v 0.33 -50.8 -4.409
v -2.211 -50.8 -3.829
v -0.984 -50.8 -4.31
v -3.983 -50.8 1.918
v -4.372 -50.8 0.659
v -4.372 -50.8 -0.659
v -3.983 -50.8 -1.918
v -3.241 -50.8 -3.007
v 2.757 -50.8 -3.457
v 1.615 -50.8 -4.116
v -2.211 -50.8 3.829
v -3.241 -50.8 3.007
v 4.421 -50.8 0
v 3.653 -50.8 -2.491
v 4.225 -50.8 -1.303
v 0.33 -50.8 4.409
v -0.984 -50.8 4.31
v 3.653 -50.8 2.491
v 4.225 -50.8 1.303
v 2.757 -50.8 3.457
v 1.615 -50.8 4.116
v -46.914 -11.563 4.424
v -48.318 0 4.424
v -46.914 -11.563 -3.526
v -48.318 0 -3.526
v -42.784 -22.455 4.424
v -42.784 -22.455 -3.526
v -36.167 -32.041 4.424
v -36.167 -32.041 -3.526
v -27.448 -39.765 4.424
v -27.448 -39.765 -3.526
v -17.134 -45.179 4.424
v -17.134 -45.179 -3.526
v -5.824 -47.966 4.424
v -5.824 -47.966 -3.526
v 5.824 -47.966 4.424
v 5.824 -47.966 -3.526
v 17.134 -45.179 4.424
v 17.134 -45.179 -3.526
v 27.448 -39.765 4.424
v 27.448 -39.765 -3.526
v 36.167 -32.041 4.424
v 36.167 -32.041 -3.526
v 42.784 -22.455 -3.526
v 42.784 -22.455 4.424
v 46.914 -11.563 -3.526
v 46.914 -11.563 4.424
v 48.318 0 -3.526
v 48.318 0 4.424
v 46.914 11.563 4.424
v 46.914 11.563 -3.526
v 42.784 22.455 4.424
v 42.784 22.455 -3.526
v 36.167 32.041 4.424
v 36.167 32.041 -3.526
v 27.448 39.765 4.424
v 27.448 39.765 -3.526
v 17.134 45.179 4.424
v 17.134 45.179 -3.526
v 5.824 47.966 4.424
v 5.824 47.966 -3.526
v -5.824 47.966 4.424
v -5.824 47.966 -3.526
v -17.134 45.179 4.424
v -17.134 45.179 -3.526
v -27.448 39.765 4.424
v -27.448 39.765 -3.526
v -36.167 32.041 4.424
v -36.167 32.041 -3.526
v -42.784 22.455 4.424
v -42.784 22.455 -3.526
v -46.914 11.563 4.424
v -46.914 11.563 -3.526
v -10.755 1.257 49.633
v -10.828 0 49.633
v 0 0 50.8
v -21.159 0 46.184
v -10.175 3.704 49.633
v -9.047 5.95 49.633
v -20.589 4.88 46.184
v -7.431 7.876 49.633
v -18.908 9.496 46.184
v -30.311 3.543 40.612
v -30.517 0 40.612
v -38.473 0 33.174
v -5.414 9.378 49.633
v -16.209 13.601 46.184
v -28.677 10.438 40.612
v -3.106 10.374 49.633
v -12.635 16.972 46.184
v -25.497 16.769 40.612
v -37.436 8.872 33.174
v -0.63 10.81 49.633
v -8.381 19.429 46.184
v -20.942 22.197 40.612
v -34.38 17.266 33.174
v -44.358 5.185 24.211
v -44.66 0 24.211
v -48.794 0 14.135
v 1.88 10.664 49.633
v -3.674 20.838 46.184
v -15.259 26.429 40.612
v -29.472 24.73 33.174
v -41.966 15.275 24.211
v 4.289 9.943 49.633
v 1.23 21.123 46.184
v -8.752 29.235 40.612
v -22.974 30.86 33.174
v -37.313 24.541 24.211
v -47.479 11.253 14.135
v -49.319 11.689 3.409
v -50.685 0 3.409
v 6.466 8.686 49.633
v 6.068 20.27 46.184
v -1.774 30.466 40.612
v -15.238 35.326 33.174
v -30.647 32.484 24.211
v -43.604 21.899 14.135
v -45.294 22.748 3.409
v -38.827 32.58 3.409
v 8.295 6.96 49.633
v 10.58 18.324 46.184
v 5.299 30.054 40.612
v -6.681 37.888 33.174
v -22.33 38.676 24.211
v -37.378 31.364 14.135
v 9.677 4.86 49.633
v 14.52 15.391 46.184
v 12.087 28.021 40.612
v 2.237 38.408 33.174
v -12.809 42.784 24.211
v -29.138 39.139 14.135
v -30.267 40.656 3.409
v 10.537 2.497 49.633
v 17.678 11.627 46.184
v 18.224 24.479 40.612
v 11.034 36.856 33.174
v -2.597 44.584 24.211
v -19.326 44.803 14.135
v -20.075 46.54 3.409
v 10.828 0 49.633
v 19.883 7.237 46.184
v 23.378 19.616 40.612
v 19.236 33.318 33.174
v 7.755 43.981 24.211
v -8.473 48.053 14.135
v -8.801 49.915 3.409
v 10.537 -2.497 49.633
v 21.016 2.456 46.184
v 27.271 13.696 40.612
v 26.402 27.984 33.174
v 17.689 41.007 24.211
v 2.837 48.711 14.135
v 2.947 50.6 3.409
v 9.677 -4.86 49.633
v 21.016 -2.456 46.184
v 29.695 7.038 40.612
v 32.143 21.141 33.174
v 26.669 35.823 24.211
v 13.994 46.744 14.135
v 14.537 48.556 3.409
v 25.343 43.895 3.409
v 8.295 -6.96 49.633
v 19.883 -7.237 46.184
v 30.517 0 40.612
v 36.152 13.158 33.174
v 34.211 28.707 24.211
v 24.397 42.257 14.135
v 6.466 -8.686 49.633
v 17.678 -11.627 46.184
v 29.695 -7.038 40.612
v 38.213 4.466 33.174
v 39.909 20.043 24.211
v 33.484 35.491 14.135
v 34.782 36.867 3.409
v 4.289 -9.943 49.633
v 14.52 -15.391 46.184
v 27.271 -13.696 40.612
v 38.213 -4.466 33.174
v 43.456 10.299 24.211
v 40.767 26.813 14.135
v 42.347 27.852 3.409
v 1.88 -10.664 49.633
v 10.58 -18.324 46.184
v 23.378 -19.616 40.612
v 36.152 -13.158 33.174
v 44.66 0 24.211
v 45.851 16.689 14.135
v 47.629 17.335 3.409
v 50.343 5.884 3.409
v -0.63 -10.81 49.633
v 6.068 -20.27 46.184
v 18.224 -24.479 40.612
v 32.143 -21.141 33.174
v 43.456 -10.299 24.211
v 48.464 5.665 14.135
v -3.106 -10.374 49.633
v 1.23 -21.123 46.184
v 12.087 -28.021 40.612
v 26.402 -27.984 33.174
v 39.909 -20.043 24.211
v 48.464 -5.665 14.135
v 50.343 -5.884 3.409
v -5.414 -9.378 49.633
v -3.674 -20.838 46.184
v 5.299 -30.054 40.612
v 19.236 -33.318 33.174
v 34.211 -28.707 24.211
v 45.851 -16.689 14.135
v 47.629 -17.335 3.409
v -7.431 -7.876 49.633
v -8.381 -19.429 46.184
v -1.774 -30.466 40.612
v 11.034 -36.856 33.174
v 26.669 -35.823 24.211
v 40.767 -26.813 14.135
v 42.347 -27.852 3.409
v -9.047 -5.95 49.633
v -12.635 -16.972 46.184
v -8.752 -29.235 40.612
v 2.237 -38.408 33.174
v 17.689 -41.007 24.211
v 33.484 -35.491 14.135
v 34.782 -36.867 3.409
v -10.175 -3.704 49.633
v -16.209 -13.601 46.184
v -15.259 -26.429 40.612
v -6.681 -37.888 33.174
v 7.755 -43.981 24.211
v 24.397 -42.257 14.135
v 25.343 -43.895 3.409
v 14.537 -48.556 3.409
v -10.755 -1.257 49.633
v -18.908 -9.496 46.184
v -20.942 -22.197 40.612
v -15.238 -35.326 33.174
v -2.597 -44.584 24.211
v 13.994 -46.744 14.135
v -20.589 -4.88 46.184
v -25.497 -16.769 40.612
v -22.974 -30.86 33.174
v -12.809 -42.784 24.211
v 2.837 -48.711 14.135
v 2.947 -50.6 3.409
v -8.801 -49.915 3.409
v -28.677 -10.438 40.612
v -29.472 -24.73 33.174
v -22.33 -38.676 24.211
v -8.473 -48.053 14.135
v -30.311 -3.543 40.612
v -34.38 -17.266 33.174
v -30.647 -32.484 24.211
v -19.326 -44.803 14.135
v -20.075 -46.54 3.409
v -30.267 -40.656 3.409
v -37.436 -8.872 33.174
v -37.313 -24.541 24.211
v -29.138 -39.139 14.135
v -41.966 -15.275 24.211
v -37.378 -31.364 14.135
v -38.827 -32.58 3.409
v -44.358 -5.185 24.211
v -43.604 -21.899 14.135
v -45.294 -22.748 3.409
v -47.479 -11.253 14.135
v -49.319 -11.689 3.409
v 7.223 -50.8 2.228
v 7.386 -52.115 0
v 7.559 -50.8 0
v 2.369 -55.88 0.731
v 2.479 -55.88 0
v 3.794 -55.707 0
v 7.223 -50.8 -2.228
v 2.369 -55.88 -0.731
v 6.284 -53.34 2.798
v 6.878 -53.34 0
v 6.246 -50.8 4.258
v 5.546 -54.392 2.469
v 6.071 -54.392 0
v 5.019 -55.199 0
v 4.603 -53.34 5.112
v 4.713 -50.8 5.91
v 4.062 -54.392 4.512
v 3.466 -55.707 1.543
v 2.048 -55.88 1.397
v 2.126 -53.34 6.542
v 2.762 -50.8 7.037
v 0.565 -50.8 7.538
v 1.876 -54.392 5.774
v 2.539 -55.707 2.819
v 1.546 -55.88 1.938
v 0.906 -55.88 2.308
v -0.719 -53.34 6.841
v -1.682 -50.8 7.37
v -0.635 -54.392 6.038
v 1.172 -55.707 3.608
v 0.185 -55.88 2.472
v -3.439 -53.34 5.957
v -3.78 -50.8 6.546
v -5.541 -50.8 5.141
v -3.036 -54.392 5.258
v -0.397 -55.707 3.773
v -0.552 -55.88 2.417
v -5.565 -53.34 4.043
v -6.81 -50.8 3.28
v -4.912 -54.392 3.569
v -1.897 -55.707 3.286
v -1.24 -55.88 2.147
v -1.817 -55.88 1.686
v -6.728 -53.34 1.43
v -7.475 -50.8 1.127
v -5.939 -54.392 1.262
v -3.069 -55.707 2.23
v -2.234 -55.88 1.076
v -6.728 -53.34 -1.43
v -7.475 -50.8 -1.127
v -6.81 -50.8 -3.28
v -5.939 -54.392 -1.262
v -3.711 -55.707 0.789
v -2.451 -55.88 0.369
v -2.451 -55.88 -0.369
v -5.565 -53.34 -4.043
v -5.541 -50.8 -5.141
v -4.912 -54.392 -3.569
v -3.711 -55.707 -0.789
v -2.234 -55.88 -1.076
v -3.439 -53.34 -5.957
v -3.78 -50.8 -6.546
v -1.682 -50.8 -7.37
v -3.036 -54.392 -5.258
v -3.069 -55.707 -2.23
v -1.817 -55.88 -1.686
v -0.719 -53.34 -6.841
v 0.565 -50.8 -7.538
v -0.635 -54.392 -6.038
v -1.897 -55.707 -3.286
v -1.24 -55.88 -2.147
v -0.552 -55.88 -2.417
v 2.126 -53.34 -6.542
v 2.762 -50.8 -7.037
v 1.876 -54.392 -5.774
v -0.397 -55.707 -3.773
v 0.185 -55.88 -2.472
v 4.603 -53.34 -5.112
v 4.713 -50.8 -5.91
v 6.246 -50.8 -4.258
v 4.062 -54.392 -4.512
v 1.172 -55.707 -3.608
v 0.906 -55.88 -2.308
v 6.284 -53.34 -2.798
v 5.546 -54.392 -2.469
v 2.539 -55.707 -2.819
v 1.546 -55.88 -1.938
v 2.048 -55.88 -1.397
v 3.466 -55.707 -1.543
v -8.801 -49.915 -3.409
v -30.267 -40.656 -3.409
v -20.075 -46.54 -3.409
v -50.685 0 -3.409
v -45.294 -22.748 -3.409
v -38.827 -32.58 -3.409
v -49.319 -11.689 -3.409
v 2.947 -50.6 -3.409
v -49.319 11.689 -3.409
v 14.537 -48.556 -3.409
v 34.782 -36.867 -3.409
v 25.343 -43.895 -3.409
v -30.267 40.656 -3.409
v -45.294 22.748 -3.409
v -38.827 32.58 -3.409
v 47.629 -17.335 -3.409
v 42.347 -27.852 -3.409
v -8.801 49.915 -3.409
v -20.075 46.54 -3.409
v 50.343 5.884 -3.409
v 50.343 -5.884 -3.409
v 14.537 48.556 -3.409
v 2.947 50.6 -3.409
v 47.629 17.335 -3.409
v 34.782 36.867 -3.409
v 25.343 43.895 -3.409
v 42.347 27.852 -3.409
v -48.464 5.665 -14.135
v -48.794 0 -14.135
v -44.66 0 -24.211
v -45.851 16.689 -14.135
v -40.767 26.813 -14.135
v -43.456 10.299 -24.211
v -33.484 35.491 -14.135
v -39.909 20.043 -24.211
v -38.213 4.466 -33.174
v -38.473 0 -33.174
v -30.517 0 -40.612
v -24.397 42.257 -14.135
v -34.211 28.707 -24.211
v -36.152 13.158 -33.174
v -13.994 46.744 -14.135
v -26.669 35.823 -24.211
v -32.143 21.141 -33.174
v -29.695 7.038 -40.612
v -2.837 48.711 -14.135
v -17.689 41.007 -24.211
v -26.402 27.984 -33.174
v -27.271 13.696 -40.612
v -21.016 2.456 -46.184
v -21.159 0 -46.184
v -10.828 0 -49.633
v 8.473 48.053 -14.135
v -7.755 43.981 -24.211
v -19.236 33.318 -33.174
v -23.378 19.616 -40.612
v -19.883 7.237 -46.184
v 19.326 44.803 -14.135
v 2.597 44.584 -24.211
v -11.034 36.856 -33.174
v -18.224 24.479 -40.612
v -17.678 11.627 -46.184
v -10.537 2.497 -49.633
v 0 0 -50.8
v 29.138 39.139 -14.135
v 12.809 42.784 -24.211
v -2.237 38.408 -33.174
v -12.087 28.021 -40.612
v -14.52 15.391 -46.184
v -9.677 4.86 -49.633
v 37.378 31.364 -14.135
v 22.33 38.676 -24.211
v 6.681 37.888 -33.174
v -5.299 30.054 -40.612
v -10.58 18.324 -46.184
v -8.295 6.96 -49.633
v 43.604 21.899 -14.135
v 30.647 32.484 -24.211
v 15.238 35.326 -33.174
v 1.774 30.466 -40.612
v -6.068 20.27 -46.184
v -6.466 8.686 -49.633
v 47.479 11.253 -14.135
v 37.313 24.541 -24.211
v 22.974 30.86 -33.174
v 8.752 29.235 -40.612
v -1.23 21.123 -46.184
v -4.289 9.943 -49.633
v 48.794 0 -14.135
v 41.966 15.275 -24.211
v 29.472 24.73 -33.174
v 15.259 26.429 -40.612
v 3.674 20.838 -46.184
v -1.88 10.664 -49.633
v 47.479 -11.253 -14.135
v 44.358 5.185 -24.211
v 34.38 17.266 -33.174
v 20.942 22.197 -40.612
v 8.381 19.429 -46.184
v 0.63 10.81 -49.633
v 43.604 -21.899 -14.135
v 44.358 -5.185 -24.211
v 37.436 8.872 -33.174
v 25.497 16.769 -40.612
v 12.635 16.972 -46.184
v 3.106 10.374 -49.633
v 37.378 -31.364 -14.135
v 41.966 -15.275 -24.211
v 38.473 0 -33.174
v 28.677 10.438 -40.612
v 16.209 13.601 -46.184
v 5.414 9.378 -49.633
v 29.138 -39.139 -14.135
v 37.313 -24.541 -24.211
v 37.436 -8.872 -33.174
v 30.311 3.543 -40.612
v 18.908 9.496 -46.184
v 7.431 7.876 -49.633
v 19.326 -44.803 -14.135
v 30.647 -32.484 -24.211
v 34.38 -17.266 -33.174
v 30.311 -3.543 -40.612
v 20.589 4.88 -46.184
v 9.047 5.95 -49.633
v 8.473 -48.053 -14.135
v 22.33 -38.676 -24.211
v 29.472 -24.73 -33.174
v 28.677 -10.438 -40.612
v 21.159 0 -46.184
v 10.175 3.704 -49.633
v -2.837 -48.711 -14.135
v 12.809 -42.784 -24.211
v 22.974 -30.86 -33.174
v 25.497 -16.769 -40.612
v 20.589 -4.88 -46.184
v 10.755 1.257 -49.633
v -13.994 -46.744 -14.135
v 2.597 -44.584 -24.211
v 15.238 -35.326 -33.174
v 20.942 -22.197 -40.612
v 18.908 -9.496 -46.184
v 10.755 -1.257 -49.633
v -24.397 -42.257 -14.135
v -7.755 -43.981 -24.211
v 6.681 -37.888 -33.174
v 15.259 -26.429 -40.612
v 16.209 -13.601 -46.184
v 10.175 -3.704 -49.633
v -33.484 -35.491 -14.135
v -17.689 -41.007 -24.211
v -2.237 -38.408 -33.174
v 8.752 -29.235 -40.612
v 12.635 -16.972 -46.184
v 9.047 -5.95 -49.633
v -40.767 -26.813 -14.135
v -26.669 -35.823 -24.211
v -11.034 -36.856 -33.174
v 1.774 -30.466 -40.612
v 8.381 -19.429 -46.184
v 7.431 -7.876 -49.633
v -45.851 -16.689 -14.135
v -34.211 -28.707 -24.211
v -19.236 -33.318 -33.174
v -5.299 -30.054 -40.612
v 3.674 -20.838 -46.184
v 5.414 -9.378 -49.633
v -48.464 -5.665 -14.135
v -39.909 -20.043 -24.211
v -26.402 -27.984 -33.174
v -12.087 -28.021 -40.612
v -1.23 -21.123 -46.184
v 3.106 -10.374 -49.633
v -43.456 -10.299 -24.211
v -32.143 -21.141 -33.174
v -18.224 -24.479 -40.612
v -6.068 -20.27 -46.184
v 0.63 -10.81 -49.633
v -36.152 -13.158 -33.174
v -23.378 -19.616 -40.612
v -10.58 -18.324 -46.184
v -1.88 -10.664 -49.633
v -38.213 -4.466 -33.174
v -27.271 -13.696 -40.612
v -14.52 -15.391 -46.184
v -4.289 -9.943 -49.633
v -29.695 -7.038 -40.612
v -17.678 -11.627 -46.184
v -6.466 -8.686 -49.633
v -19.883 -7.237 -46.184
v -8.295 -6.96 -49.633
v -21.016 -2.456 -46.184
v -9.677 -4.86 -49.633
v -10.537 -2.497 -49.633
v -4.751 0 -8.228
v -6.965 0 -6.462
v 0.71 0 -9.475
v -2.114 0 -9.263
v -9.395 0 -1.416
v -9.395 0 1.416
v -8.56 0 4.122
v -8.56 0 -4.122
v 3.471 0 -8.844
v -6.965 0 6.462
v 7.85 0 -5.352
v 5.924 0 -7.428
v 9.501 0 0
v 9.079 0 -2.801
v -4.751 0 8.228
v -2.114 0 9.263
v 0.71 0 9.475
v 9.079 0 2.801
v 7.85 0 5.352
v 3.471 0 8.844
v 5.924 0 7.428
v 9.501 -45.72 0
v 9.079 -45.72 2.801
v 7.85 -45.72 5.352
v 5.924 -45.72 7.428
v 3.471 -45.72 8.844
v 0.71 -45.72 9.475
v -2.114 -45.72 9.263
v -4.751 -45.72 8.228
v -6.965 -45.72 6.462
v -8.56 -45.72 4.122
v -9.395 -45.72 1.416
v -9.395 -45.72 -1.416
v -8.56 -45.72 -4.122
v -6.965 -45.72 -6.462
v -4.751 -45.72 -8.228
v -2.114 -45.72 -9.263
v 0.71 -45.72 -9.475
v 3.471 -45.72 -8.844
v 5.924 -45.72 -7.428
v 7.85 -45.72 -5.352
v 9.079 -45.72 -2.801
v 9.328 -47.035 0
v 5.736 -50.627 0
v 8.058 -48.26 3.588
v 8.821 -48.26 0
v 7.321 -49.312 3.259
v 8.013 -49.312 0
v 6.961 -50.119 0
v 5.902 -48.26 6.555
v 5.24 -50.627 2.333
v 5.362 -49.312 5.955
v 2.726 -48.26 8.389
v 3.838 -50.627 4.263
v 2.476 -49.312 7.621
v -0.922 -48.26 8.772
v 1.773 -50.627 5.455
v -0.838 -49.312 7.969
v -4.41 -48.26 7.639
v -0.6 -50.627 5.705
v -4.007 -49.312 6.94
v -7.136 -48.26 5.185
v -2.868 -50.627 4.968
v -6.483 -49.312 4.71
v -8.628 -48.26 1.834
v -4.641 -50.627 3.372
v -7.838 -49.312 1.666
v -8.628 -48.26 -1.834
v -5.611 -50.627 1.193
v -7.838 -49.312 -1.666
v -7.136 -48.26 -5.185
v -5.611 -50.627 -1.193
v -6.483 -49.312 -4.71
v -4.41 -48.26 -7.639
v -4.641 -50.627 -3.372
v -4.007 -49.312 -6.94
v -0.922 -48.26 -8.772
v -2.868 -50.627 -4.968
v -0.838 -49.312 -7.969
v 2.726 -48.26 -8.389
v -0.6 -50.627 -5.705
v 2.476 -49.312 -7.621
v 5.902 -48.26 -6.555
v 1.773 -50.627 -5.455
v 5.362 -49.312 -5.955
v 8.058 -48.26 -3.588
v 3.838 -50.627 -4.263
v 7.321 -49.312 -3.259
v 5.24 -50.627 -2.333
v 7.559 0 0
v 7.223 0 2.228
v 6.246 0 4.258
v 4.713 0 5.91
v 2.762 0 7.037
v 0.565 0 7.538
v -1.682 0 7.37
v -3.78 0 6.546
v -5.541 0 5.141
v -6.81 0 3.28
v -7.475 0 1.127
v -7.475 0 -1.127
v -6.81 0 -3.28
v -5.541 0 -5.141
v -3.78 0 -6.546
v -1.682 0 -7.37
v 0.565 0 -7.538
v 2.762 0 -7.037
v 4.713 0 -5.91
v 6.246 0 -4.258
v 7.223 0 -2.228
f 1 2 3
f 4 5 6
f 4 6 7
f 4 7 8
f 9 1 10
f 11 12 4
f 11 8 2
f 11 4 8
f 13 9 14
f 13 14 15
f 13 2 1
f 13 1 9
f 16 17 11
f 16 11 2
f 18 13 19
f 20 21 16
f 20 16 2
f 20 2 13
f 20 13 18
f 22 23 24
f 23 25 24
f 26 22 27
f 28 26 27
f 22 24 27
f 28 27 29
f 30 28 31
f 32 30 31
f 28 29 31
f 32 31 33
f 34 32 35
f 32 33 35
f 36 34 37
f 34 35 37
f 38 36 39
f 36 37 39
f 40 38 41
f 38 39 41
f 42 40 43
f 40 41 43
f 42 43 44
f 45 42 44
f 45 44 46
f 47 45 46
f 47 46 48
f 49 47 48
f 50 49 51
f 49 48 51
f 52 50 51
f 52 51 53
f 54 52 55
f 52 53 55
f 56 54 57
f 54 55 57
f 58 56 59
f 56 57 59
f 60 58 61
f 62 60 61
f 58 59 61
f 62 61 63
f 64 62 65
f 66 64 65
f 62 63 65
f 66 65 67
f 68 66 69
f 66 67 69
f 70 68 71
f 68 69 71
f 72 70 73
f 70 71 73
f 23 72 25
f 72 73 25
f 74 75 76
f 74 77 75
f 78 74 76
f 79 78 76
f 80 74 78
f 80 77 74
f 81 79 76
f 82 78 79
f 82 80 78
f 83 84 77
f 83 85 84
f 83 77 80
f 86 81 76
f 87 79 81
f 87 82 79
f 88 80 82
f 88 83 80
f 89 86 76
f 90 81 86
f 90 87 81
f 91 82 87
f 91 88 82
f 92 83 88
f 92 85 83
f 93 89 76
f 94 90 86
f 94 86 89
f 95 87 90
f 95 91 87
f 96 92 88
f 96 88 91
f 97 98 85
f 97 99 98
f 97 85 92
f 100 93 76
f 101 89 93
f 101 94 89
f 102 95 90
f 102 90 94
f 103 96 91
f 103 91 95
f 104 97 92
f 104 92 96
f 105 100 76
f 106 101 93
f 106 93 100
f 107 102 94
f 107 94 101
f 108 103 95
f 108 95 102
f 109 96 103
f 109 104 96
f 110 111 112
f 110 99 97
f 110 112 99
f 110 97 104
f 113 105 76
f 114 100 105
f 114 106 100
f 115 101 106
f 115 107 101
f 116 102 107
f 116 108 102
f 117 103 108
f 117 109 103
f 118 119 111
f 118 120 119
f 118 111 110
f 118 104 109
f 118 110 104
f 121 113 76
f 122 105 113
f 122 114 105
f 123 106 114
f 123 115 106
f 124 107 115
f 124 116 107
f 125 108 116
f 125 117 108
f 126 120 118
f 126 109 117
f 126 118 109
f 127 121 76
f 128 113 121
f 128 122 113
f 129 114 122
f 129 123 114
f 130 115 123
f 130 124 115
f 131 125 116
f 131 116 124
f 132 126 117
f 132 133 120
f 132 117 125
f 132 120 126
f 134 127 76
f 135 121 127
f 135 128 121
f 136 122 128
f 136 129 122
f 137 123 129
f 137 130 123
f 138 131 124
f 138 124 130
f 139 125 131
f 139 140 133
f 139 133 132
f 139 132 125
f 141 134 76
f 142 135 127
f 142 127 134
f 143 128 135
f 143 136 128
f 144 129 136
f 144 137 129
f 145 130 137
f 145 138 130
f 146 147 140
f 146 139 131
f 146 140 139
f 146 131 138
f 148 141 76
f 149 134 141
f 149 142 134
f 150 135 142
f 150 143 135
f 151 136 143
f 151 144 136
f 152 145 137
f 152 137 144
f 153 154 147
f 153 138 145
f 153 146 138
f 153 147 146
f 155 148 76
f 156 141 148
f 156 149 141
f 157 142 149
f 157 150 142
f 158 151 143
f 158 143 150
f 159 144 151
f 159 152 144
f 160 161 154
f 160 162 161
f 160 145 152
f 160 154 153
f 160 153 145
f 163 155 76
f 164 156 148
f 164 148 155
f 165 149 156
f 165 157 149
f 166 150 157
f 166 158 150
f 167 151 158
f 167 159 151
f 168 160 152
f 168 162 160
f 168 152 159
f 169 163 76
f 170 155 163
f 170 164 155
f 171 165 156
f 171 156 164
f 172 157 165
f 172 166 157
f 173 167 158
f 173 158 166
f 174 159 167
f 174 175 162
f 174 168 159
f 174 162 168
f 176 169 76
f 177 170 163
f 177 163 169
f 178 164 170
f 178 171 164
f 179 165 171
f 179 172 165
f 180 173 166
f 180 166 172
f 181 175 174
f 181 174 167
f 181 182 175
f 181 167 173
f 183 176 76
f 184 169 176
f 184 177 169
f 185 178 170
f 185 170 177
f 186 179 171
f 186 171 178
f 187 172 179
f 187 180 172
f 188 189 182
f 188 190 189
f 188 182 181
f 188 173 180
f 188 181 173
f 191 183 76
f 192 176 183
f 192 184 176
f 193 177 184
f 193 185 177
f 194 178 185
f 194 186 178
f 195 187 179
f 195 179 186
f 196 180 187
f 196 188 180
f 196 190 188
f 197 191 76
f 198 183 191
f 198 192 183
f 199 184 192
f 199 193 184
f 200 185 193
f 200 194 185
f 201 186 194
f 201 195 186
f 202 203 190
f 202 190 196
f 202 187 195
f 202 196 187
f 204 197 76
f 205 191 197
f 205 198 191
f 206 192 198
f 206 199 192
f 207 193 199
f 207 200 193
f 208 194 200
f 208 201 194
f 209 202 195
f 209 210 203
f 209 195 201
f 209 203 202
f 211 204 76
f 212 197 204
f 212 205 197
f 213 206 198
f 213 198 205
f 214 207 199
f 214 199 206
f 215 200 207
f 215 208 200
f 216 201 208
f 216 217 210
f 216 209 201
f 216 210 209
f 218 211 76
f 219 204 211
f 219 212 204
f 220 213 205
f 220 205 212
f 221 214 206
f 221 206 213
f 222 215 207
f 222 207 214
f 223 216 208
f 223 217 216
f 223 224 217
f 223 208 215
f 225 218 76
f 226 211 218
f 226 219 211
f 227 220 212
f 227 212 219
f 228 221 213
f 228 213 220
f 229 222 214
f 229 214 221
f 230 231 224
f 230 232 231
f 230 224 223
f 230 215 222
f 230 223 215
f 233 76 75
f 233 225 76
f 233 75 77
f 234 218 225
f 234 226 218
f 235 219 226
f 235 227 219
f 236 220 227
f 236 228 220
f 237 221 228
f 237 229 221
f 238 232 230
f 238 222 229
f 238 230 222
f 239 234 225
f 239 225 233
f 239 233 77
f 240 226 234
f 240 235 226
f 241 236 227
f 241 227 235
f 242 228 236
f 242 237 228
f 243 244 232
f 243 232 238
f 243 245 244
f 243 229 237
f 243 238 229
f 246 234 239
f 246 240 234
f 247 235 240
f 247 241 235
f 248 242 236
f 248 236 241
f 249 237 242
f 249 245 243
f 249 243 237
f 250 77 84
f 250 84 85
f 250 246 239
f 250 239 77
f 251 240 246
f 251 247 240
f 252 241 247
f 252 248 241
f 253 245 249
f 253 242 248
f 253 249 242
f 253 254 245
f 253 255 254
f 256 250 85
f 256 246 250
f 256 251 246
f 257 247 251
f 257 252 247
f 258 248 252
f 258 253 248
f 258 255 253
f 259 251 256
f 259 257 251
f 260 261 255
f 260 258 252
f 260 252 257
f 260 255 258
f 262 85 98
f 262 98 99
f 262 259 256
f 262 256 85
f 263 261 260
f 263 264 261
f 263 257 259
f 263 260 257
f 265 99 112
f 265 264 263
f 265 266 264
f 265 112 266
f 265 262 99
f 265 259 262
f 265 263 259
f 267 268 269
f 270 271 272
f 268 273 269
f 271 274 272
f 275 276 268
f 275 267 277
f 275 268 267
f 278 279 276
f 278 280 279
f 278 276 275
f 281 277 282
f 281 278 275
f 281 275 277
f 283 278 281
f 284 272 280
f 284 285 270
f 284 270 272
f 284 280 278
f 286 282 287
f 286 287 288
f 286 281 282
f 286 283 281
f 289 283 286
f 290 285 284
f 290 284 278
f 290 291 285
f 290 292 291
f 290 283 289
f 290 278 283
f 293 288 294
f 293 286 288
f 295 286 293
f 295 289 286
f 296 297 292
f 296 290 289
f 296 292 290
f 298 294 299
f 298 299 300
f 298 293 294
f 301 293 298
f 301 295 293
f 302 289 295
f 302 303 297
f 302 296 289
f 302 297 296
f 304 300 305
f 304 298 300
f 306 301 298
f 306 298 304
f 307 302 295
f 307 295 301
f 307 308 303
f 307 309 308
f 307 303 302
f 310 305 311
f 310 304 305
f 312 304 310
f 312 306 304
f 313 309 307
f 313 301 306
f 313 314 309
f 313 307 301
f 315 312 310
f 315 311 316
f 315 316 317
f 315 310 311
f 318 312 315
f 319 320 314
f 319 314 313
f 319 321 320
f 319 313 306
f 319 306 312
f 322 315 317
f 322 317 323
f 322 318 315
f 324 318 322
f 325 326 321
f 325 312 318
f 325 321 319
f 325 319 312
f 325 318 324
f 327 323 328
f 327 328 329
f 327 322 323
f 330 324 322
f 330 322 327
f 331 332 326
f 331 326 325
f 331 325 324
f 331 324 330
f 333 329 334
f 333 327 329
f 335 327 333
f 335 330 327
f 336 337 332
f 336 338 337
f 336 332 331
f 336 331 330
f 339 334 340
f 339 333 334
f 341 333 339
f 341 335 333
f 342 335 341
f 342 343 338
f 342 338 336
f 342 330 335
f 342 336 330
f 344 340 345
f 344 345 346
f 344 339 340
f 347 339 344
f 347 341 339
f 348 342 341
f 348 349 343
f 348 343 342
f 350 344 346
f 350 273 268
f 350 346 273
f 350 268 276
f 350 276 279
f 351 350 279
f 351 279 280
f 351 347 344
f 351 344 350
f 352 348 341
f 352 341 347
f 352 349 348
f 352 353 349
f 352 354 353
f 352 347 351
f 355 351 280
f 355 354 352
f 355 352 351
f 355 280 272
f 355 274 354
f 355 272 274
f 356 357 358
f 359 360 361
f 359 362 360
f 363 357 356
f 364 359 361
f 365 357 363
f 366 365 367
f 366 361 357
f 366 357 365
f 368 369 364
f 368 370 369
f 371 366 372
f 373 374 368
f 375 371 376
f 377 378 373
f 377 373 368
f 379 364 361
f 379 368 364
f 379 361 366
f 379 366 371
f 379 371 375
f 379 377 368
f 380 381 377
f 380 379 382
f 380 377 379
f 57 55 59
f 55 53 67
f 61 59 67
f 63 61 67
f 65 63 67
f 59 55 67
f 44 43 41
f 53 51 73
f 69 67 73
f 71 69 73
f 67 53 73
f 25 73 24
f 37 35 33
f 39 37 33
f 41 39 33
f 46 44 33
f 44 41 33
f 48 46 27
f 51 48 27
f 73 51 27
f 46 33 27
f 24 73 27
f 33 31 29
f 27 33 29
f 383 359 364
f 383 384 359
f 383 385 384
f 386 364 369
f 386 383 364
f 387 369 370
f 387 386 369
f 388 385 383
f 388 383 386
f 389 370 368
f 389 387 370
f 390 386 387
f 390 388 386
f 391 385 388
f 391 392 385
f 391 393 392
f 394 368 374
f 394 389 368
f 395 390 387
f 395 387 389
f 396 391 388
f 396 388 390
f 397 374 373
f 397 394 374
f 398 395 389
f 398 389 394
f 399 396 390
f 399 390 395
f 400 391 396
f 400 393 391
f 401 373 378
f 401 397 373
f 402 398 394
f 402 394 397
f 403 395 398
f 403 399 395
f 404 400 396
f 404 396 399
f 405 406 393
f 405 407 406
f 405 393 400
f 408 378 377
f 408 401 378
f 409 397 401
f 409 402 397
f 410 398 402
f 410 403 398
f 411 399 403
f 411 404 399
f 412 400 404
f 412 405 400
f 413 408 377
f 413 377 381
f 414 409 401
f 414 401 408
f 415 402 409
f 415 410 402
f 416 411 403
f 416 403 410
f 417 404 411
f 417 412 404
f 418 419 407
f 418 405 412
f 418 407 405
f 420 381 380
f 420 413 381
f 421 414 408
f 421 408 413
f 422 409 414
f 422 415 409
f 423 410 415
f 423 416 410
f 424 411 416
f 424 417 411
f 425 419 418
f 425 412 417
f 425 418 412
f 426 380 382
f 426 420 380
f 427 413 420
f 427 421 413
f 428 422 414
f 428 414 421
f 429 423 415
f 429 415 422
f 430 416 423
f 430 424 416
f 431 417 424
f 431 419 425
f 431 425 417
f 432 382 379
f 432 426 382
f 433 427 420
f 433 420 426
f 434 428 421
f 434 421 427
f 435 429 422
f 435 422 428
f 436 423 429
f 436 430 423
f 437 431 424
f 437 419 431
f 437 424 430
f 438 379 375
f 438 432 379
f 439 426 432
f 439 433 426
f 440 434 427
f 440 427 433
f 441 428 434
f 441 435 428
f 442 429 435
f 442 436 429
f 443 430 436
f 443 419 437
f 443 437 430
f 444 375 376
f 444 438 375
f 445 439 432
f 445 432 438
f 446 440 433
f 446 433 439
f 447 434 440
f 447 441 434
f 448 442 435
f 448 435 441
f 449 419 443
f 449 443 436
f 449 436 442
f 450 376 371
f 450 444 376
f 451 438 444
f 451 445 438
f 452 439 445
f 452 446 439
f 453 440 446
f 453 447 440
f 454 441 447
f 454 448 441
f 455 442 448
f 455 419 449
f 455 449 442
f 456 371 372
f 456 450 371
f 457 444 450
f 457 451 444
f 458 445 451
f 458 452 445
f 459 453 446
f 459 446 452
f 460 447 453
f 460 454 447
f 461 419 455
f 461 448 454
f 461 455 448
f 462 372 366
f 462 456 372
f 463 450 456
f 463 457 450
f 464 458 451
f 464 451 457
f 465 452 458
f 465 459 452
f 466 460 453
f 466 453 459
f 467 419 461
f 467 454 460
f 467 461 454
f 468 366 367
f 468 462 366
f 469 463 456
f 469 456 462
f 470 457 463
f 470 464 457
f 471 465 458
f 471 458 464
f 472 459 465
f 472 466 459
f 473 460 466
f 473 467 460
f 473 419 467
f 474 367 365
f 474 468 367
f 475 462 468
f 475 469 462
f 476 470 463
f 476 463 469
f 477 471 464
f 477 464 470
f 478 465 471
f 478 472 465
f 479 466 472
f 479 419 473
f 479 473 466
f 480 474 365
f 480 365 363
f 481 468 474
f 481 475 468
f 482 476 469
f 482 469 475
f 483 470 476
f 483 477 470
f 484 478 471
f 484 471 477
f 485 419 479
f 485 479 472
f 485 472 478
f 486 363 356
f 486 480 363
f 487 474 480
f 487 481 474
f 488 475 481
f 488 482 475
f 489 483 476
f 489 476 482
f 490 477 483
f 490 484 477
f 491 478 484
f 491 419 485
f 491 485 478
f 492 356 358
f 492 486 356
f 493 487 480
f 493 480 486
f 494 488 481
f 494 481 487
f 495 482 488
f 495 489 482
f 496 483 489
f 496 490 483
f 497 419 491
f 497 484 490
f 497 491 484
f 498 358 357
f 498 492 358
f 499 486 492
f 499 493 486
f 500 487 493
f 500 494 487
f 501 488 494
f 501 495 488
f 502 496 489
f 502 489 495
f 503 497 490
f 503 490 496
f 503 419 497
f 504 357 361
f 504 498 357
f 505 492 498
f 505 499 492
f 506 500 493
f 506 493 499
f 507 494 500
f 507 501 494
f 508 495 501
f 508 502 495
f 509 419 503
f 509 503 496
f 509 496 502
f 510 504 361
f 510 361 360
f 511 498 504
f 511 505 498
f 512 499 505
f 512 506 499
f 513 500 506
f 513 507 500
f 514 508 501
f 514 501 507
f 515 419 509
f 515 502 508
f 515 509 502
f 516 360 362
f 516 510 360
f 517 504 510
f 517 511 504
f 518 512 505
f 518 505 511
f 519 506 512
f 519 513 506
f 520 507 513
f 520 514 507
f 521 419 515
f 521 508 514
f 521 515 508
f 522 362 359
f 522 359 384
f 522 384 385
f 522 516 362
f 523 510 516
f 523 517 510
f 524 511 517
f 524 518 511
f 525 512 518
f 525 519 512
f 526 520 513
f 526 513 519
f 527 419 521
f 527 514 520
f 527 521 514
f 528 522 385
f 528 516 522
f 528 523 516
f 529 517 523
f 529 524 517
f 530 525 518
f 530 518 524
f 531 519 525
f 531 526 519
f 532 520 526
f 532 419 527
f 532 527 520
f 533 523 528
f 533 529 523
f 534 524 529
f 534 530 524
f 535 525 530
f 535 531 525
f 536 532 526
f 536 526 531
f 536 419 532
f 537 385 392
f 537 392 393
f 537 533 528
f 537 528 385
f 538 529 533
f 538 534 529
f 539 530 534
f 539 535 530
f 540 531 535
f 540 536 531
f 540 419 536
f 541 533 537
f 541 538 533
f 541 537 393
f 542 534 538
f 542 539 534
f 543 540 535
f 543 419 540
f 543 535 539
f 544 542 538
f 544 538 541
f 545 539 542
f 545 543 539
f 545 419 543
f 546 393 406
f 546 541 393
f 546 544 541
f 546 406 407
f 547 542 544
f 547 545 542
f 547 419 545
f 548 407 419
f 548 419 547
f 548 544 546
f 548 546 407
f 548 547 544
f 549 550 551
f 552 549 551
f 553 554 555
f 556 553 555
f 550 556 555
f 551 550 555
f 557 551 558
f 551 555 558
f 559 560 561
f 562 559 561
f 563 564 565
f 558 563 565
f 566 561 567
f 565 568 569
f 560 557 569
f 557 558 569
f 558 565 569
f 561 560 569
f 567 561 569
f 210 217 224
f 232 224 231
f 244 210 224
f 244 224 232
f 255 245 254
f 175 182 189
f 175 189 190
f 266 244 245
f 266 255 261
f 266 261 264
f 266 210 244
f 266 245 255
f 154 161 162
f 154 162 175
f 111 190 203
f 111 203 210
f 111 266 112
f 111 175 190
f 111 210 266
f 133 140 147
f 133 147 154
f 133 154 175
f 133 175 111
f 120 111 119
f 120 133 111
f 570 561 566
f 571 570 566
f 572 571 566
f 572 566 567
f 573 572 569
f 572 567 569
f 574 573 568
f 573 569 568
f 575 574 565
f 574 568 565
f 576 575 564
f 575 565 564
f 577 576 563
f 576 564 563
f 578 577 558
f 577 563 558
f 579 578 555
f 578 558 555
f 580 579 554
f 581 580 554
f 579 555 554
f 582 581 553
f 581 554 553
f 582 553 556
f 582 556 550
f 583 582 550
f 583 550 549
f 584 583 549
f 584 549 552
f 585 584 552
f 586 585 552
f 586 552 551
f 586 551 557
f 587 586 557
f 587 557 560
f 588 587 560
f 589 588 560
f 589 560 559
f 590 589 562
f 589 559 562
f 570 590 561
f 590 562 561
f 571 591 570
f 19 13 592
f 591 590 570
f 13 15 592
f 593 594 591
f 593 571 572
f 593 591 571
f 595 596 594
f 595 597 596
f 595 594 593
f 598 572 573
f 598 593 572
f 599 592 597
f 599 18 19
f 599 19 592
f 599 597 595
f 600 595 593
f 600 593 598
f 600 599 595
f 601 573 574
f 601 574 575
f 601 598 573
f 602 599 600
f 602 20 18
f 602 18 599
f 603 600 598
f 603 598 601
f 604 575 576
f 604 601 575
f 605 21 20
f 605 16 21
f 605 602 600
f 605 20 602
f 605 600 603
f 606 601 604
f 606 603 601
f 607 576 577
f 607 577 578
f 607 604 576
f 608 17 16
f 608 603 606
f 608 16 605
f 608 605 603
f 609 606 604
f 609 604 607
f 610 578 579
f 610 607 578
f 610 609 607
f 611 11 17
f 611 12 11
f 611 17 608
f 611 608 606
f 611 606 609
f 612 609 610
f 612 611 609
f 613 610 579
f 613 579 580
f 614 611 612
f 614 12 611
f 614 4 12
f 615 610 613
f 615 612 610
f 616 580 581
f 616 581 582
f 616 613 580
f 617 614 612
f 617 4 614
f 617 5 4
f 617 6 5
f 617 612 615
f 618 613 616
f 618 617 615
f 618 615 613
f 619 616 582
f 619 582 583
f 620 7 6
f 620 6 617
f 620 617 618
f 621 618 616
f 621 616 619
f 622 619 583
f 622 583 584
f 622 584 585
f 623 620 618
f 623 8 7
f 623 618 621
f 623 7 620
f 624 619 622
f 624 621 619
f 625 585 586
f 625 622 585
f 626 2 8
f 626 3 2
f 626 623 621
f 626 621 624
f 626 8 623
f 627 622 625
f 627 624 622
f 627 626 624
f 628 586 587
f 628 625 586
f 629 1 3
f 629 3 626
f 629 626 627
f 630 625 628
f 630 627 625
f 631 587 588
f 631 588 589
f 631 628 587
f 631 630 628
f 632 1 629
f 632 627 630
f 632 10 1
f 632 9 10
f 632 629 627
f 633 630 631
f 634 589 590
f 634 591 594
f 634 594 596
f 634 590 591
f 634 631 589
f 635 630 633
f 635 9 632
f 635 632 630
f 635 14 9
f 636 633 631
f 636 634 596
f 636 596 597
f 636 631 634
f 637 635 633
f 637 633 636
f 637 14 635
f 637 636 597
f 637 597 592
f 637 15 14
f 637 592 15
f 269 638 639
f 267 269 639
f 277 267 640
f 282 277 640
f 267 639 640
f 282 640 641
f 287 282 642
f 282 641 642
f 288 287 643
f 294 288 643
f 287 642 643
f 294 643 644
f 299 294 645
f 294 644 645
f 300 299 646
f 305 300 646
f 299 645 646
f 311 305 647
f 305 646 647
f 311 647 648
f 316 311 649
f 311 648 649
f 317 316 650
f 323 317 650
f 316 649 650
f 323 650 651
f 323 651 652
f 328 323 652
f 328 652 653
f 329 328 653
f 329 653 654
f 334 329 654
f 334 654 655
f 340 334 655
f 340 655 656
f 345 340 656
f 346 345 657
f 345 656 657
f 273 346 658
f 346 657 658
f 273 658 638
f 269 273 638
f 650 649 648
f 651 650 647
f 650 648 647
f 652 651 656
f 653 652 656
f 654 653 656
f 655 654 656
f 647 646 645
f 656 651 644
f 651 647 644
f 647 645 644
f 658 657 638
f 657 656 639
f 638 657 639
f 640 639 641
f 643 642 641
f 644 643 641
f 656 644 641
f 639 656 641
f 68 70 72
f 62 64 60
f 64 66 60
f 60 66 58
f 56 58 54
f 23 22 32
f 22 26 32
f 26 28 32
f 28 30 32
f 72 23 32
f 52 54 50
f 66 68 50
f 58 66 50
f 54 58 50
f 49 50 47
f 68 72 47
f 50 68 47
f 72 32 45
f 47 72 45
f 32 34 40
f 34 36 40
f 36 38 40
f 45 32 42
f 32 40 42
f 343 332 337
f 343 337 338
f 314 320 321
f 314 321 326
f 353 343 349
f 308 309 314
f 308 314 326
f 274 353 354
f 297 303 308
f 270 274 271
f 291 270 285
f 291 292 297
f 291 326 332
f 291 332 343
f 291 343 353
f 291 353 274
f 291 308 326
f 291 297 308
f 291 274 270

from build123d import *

# Parameters (mm, degrees)
F4_R     = 9.501223813
F5_DEPTH = 50.8
F6_R     = 7.5590710891
F7_DEPTH = 55.88
F8_R     = 5.08
F8_2_R   = 5.08


with BuildPart() as f1:
    # F0 (on Front) → F1 (revolve)
    with BuildSketch(Plane.XZ):
        with BuildLine():
            Line((0, 3.4089474939), (0, 50.8))
            ThreePointArc((0, 50.8), (-34.694851688, 37.1067010976), (-50.68549178, 3.4089474939))
            Line((-50.68549178, 3.4089474939), (0, 3.4089474939))
        make_face()
    revolve(axis=Axis((0, 0, -1.2031570077), (0, 0, -1)))


with BuildPart() as f1b:
    # F0 (on Front) → F1, piece 2 (revolve)
    with BuildSketch(Plane.XZ):
        with BuildLine():
            ThreePointArc((-50.68549178, -3.4089474939), (-34.694851688, -37.1067010976), (0, -50.8))
            Line((0, -50.8), (0, -3.4089474939))
            Line((0, -3.4089474939), (-50.68549178, -3.4089474939))
        make_face()
    revolve(axis=Axis((0, 0, -1.2031570077), (0, 0, -1)))


with BuildPart() as f3:
    # F2 (on Front) → F3 (revolve)
    with BuildSketch(Plane.XZ):
        Polygon((0, 3.6667124368), (0, 4.4237989932), (-48.3184829354, 4.4237989932), (-48.3184829354, -3.525609849), (0, -3.525609849), align=None)
    revolve(axis=Axis((0, 0, 0.0705512939), (0, 0, 1)))


with BuildPart() as f5:
    # F4 (on Front) → F5 (new body)
    with BuildSketch(Plane.XZ):
        Circle(F4_R)
    extrude(amount=F5_DEPTH)

    # F8#2
    f8_2_edges = [f5.edges().sort_by_distance(p)[0] for p in [
        (-9.501224, -50.8, 0),
    ]]
    fillet(f8_2_edges, radius=F8_2_R)


with BuildPart() as f7:
    # F6 (on Front) → F7 (new body)
    with BuildSketch(Plane.XZ):
        Circle(F6_R)
    extrude(amount=F7_DEPTH)

    # F8
    f8_edges = [f7.edges().sort_by_distance(p)[0] for p in [
        (-7.559071, -55.88, 0),
    ]]
    fillet(f8_edges, radius=F8_R)


solid = Compound([f1.part, f1b.part, f3.part, f5.part, f7.part])
